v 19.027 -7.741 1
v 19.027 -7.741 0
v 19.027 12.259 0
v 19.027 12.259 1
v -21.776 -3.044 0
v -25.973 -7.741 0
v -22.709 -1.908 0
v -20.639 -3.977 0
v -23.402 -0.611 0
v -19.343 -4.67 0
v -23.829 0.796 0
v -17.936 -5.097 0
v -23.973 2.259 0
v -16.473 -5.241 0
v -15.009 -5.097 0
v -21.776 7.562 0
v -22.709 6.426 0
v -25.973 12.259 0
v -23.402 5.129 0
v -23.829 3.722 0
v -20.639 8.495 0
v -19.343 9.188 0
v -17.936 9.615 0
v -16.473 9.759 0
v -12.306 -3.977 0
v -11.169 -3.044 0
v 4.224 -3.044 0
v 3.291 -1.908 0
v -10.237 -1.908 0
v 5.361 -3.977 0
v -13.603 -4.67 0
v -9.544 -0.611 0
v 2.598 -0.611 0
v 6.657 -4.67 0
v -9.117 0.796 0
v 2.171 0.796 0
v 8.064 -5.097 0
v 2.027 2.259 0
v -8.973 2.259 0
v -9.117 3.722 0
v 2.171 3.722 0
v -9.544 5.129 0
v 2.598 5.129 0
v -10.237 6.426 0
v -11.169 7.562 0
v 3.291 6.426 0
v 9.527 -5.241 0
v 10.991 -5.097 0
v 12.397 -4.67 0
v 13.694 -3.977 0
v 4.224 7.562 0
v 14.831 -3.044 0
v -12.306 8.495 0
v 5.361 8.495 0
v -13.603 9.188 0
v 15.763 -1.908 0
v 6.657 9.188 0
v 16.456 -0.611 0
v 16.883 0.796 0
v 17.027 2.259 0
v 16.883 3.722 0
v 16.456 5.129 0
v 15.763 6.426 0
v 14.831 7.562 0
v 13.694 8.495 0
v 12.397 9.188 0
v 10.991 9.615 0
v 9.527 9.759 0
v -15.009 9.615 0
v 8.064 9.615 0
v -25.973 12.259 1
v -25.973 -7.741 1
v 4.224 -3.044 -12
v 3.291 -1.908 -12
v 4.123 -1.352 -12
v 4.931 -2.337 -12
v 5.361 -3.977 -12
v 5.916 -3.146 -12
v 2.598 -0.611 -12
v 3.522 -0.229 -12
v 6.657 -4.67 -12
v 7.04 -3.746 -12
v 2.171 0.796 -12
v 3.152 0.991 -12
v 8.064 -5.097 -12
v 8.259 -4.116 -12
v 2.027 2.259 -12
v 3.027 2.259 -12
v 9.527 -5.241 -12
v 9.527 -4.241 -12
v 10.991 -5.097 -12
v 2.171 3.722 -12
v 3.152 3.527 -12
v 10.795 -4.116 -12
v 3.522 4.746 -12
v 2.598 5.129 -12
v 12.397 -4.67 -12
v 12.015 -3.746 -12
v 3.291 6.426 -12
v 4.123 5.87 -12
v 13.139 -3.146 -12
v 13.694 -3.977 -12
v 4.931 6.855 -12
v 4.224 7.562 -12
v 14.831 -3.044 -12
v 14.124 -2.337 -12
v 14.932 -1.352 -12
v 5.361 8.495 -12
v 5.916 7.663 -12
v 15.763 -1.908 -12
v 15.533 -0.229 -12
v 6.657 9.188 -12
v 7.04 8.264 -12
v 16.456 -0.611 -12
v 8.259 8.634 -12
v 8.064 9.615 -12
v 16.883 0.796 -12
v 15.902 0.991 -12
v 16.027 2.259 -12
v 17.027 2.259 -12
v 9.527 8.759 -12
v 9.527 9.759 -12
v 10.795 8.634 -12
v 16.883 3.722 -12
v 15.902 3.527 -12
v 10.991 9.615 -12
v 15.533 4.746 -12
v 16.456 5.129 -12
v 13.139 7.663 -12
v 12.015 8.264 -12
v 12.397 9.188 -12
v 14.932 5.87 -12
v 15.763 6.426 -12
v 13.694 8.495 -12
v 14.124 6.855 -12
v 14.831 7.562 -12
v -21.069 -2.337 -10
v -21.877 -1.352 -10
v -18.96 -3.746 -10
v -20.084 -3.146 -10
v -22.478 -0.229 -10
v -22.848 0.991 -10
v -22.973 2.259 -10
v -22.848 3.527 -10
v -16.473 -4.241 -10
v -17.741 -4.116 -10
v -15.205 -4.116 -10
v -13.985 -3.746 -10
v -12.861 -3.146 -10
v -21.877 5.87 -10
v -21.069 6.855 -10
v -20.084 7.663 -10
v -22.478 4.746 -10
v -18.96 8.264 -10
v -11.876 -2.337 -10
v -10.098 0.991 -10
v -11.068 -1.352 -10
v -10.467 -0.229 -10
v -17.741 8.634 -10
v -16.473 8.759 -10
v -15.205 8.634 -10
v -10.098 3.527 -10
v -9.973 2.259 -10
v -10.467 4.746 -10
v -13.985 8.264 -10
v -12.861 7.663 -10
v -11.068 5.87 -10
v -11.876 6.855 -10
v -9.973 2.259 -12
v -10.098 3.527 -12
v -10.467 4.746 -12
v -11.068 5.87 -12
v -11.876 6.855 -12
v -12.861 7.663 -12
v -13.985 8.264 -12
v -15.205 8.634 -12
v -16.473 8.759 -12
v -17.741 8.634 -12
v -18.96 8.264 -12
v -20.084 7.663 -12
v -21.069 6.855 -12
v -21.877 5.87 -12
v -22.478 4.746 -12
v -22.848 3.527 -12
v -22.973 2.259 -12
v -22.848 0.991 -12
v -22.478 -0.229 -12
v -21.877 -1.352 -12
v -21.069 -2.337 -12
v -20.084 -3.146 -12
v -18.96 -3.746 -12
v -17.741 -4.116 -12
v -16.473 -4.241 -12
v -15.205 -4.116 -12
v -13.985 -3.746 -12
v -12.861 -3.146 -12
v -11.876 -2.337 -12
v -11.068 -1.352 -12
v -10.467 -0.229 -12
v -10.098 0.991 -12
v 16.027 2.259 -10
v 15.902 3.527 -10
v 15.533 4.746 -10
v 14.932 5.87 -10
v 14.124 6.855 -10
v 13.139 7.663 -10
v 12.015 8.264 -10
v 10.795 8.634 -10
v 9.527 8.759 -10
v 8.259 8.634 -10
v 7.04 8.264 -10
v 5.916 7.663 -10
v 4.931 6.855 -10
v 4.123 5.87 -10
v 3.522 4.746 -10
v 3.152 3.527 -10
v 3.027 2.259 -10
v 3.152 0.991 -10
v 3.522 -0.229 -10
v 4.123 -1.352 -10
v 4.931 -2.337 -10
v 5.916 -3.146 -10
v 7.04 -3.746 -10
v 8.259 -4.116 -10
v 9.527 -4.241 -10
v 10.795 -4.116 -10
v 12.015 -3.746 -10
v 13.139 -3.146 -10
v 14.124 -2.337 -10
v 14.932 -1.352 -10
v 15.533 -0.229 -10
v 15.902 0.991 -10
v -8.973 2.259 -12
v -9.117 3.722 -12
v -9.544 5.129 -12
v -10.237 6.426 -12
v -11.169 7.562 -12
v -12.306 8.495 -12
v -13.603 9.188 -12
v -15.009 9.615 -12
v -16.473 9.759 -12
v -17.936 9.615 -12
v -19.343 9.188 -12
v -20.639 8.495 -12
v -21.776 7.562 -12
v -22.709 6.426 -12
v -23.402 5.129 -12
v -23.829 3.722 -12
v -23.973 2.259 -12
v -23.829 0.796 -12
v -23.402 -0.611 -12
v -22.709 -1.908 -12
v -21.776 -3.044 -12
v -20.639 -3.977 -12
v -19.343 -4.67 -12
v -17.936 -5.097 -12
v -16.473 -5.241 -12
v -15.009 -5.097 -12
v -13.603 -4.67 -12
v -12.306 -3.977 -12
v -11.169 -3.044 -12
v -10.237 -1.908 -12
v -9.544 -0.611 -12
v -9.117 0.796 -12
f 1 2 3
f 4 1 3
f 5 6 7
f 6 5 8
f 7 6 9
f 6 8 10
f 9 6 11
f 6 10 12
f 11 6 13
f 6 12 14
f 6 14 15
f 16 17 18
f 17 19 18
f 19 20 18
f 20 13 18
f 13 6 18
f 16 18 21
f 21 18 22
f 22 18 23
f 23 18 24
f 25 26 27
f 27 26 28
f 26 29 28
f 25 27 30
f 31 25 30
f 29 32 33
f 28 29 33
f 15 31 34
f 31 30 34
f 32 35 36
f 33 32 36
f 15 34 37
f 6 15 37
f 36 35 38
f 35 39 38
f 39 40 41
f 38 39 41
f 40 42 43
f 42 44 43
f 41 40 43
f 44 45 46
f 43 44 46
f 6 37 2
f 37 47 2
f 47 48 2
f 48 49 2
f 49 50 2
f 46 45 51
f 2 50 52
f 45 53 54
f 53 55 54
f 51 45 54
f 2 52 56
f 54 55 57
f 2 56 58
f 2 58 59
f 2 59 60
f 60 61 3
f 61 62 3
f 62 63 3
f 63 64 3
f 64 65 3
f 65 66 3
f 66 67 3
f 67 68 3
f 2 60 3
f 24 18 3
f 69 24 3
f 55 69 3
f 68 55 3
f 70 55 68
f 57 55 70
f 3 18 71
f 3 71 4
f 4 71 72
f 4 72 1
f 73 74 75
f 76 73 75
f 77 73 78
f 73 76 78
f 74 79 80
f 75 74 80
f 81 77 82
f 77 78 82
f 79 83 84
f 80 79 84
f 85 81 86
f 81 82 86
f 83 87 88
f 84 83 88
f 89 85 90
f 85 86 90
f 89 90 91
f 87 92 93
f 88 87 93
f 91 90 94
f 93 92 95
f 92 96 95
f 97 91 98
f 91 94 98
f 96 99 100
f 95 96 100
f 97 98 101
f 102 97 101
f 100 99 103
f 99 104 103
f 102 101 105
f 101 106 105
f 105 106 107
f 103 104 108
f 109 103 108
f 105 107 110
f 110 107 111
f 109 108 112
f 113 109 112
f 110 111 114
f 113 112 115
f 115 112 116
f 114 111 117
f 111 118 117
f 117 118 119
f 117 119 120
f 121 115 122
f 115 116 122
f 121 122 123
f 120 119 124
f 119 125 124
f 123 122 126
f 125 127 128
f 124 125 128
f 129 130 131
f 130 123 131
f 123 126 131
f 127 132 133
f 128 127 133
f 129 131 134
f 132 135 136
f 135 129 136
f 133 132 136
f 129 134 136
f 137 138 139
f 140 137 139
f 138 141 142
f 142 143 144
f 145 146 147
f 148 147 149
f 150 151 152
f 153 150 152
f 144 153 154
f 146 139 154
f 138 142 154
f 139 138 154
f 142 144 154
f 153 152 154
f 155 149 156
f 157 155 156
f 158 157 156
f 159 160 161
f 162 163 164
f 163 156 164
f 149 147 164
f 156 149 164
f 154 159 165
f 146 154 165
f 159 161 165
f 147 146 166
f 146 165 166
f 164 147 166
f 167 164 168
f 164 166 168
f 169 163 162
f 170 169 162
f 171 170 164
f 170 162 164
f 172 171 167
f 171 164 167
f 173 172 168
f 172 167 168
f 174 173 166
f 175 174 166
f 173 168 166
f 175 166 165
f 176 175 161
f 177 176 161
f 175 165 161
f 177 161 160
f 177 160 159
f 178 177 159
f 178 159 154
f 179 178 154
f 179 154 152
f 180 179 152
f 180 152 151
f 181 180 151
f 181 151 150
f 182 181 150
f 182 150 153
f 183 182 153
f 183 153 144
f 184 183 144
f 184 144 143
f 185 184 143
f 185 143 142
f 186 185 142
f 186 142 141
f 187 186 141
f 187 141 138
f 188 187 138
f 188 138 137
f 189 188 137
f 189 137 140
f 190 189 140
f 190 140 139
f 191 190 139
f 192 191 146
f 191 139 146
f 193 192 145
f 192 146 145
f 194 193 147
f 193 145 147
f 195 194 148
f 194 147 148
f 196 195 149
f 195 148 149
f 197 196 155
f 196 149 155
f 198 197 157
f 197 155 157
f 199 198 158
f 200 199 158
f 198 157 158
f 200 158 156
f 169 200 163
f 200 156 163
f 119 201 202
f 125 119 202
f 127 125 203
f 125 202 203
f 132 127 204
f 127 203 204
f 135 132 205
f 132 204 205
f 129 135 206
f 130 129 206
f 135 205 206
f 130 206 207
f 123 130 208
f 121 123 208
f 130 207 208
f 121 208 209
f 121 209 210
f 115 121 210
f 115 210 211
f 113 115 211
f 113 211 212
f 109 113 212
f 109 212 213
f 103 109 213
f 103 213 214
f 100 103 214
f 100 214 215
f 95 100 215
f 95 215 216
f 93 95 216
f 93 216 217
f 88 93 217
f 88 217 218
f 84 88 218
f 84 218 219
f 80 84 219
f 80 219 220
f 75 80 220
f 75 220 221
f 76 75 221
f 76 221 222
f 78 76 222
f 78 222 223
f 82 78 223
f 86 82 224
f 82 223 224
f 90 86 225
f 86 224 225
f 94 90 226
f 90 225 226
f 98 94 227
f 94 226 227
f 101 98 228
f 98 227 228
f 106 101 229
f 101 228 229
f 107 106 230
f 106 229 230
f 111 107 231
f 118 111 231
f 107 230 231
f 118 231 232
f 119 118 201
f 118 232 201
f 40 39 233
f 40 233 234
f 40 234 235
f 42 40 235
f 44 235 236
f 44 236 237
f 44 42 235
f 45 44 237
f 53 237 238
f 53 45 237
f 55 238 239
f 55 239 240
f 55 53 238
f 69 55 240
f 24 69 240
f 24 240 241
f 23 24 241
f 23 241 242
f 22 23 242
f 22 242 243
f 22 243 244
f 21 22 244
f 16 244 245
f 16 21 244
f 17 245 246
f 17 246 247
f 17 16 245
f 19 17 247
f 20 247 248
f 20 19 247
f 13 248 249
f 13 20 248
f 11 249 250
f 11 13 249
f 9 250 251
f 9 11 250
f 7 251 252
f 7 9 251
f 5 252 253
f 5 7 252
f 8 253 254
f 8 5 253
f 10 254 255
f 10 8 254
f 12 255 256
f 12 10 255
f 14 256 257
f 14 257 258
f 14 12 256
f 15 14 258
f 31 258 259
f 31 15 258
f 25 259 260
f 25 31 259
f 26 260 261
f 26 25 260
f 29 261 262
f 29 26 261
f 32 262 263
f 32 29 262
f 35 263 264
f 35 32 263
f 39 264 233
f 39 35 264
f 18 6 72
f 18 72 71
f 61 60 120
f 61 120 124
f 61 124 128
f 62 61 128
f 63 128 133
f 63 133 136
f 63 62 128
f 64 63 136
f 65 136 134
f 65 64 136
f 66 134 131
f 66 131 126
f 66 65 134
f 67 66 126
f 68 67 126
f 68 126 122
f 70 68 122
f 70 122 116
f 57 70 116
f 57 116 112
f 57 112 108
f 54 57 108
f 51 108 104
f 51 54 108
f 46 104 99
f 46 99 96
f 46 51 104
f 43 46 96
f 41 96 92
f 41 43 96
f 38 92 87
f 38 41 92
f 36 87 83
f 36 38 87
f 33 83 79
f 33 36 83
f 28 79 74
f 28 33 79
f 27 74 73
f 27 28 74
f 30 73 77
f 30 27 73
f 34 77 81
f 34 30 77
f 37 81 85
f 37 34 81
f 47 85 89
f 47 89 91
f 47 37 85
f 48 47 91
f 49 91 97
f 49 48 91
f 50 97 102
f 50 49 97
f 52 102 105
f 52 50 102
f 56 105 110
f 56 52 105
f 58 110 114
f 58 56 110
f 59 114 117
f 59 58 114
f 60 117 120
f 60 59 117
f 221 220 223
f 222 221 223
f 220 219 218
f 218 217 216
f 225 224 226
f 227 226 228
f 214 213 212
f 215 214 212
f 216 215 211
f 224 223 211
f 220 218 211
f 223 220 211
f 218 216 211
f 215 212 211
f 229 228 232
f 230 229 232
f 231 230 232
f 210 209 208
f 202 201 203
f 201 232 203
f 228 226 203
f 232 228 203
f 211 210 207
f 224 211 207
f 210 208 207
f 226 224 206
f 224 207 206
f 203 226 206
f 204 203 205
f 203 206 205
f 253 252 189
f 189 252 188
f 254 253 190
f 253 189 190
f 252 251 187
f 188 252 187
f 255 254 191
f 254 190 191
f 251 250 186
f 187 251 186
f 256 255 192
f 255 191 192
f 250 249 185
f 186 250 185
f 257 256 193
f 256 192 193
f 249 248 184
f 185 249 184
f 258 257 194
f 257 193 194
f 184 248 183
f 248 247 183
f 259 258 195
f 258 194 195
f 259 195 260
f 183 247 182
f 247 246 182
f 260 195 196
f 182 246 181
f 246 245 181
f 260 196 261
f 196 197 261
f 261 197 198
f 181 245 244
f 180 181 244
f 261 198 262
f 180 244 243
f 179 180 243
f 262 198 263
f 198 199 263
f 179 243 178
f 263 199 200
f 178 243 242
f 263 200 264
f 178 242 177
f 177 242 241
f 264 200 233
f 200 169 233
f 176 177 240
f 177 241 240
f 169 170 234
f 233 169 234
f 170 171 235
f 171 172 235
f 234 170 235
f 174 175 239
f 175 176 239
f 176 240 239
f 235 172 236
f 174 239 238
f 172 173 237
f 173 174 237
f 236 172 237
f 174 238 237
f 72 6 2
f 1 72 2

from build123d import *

# Parameters (mm, degrees)
SKETCH1_W           = 45
SKETCH1_H           = 20
BOSS_EXTRUDE1_DEPTH = 1
SKETCH2_R           = 7.5
SKETCH2_R_2         = 6.5
BOSS_EXTRUDE2_DEPTH = 12
SKETCH3_R           = 6.5
BOSS_EXTRUDE3_DEPTH = 10


with BuildPart() as part:
    # Sketch1 → Boss-Extrude1 (new body)
    with BuildSketch(Plane.XY):
        with Locations((-3.47266881, 2.258842444)):
            Rectangle(SKETCH1_W, SKETCH1_H)
    extrude(amount=BOSS_EXTRUDE1_DEPTH)

    # Sketch2 → Boss-Extrude2 (add)
    with BuildSketch(Plane.XY):
        with Locations((-16.47266881, 2.258842444)):
            Circle(SKETCH2_R)
        with Locations((-16.47266881, 2.258842444)):
            Circle(SKETCH2_R_2, mode=Mode.SUBTRACT)
        with Locations((9.52733119, 2.258842444)):
            Circle(SKETCH2_R)
        with Locations((9.52733119, 2.258842444)):
            Circle(SKETCH2_R_2, mode=Mode.SUBTRACT)
    extrude(amount=-BOSS_EXTRUDE2_DEPTH)

    # Sketch3 → Boss-Extrude3 (add)
    with BuildSketch(Plane.XY):
        with Locations((9.52733119, 2.258842444)):
            Circle(SKETCH3_R)
        with Locations((-16.47266881, 2.258842444)):
            Circle(SKETCH3_R)
    extrude(amount=-BOSS_EXTRUDE3_DEPTH)


solid = part.part
